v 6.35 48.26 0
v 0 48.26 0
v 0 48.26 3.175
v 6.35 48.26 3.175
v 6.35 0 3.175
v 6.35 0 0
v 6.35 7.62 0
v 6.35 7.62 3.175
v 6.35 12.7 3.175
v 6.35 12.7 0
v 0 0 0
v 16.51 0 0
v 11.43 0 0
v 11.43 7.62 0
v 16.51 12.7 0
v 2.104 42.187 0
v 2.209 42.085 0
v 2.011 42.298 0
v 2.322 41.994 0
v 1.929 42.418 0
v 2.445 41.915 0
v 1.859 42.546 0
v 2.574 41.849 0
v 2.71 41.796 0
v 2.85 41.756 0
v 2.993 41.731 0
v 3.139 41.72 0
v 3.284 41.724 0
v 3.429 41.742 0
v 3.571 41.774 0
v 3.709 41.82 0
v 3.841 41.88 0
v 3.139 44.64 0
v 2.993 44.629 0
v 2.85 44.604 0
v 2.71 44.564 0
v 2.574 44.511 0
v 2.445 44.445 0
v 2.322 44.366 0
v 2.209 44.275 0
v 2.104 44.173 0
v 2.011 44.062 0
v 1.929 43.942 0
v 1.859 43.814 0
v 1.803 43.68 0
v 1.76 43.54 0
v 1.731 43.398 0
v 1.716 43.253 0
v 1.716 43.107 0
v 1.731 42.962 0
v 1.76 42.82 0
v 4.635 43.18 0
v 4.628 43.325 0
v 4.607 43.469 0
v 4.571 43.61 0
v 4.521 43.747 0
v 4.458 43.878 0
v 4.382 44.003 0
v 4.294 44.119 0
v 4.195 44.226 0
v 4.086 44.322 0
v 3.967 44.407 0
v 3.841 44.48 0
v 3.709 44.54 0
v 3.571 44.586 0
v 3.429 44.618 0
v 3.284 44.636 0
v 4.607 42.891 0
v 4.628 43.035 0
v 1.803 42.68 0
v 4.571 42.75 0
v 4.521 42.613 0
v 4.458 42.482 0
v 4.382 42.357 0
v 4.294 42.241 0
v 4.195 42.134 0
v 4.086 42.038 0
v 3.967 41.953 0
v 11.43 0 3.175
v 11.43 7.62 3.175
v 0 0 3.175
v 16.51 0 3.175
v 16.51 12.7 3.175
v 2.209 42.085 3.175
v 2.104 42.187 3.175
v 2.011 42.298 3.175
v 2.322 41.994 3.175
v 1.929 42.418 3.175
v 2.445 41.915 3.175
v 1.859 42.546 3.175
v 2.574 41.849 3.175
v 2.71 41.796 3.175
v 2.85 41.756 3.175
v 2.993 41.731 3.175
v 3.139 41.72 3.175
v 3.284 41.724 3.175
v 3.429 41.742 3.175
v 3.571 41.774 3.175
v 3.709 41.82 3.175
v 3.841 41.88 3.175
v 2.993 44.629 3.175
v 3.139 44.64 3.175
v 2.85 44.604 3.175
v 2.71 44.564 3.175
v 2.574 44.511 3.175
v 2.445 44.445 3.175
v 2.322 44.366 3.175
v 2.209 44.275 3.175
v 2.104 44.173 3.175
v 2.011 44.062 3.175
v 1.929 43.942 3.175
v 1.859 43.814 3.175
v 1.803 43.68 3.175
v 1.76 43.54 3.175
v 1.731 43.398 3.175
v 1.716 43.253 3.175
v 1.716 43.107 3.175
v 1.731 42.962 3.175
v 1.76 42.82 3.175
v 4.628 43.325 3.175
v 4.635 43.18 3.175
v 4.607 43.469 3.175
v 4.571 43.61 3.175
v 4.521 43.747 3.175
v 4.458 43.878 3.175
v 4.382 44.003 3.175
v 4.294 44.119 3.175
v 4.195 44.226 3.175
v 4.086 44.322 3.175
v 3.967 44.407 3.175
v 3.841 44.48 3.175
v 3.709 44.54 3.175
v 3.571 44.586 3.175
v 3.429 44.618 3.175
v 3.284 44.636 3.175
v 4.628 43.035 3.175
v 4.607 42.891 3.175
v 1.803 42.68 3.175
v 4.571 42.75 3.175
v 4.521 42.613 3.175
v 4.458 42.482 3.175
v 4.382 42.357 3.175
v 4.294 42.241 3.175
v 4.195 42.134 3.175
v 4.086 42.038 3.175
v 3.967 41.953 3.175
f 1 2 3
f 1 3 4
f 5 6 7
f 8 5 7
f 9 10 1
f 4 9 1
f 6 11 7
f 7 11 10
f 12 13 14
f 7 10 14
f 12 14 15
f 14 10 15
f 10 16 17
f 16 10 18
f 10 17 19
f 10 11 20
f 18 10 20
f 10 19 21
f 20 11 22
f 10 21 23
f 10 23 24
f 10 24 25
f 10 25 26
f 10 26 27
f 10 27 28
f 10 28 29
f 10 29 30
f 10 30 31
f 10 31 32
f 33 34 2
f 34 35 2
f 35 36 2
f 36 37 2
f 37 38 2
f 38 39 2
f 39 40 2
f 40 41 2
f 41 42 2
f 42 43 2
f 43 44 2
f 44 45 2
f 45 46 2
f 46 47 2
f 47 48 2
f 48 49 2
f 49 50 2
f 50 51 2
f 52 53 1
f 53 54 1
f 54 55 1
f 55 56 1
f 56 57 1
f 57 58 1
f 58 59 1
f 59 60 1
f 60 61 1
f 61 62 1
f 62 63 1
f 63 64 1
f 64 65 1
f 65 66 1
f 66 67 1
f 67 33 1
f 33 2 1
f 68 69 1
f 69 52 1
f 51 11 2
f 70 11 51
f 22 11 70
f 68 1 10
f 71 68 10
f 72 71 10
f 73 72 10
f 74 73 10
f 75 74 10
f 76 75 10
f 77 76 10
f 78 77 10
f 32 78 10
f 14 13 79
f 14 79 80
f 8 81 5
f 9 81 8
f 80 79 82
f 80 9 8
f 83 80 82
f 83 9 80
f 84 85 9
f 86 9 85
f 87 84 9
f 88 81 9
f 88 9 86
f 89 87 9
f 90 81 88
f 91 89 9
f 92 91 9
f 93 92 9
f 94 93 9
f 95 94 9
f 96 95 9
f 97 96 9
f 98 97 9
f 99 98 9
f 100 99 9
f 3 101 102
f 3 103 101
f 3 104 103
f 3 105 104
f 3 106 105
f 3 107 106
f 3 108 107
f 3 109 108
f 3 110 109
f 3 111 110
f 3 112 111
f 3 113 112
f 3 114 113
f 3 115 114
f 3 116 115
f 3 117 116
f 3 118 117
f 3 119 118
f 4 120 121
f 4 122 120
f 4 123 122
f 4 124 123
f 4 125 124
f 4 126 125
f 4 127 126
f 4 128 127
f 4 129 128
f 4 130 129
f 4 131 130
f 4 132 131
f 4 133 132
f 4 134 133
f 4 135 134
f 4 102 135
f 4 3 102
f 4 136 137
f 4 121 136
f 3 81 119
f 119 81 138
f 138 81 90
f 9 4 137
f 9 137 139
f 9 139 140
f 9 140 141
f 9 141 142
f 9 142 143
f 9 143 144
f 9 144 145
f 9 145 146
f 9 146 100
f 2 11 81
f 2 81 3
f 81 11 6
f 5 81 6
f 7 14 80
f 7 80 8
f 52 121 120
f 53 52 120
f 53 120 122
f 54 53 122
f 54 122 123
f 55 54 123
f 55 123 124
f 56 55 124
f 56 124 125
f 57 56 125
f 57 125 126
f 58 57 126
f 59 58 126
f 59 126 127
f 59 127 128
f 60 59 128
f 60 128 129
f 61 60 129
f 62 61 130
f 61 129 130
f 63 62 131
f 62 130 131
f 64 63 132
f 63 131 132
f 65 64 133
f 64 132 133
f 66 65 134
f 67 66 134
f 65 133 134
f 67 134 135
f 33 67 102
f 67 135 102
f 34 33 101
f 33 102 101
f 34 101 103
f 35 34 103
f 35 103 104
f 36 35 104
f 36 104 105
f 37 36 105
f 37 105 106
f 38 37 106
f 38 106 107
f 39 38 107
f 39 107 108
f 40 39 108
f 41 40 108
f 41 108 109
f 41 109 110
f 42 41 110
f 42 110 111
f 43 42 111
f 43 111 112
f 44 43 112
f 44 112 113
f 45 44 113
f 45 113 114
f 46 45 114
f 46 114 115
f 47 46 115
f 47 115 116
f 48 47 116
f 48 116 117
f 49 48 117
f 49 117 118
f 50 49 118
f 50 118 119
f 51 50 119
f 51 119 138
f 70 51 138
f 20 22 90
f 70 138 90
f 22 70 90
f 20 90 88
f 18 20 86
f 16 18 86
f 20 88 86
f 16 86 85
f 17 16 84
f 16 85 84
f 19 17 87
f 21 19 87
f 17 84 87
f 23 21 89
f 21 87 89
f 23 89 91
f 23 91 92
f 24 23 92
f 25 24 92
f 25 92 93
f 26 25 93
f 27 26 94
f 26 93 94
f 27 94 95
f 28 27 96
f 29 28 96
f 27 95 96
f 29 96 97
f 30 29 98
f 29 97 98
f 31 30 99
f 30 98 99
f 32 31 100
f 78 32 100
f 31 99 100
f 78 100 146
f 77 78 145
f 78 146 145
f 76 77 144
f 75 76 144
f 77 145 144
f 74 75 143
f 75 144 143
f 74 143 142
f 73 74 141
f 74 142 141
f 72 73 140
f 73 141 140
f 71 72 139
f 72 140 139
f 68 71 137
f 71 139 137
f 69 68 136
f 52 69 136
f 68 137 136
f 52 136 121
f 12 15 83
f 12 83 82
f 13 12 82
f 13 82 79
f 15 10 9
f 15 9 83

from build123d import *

# Parameters (mm, degrees)
SKETCH1_W           = 6.35
SKETCH1_H           = 48.26
BOSS_EXTRUDE1_DEPTH = 3.175
SKETCH3_R           = 1.4605
CUT_EXTRUDE2_DEPTH  = 4.175
BOSS_EXTRUDE3_DEPTH = 3.175


with BuildPart() as part:
    # Sketch1 → Boss-Extrude1 (new body)
    with BuildSketch(Plane.XY):
        with Locations((3.175, 24.13)):
            Rectangle(SKETCH1_W, SKETCH1_H)
    extrude(amount=BOSS_EXTRUDE1_DEPTH)

    # Sketch3 → Cut-Extrude2 (cut, through all)
    with BuildSketch(Plane.XY.offset(3.175)):
        with Locations((3.175, 43.18)):
            Circle(SKETCH3_R)
    extrude(amount=-CUT_EXTRUDE2_DEPTH, mode=Mode.SUBTRACT)

    # Sketch5 → Boss-Extrude3 (add)
    with BuildSketch(Plane(origin=(0, 0, 0), x_dir=(-1, 0, 0), z_dir=(0, 0, -1))):
        Polygon((-6.35, 12.7), (-16.51, 12.7), (-16.51, 0), (-11.43, 0), (-11.43, 7.62), (-6.35, 7.62), align=None)
    extrude(amount=-BOSS_EXTRUDE3_DEPTH)


solid = part.part
